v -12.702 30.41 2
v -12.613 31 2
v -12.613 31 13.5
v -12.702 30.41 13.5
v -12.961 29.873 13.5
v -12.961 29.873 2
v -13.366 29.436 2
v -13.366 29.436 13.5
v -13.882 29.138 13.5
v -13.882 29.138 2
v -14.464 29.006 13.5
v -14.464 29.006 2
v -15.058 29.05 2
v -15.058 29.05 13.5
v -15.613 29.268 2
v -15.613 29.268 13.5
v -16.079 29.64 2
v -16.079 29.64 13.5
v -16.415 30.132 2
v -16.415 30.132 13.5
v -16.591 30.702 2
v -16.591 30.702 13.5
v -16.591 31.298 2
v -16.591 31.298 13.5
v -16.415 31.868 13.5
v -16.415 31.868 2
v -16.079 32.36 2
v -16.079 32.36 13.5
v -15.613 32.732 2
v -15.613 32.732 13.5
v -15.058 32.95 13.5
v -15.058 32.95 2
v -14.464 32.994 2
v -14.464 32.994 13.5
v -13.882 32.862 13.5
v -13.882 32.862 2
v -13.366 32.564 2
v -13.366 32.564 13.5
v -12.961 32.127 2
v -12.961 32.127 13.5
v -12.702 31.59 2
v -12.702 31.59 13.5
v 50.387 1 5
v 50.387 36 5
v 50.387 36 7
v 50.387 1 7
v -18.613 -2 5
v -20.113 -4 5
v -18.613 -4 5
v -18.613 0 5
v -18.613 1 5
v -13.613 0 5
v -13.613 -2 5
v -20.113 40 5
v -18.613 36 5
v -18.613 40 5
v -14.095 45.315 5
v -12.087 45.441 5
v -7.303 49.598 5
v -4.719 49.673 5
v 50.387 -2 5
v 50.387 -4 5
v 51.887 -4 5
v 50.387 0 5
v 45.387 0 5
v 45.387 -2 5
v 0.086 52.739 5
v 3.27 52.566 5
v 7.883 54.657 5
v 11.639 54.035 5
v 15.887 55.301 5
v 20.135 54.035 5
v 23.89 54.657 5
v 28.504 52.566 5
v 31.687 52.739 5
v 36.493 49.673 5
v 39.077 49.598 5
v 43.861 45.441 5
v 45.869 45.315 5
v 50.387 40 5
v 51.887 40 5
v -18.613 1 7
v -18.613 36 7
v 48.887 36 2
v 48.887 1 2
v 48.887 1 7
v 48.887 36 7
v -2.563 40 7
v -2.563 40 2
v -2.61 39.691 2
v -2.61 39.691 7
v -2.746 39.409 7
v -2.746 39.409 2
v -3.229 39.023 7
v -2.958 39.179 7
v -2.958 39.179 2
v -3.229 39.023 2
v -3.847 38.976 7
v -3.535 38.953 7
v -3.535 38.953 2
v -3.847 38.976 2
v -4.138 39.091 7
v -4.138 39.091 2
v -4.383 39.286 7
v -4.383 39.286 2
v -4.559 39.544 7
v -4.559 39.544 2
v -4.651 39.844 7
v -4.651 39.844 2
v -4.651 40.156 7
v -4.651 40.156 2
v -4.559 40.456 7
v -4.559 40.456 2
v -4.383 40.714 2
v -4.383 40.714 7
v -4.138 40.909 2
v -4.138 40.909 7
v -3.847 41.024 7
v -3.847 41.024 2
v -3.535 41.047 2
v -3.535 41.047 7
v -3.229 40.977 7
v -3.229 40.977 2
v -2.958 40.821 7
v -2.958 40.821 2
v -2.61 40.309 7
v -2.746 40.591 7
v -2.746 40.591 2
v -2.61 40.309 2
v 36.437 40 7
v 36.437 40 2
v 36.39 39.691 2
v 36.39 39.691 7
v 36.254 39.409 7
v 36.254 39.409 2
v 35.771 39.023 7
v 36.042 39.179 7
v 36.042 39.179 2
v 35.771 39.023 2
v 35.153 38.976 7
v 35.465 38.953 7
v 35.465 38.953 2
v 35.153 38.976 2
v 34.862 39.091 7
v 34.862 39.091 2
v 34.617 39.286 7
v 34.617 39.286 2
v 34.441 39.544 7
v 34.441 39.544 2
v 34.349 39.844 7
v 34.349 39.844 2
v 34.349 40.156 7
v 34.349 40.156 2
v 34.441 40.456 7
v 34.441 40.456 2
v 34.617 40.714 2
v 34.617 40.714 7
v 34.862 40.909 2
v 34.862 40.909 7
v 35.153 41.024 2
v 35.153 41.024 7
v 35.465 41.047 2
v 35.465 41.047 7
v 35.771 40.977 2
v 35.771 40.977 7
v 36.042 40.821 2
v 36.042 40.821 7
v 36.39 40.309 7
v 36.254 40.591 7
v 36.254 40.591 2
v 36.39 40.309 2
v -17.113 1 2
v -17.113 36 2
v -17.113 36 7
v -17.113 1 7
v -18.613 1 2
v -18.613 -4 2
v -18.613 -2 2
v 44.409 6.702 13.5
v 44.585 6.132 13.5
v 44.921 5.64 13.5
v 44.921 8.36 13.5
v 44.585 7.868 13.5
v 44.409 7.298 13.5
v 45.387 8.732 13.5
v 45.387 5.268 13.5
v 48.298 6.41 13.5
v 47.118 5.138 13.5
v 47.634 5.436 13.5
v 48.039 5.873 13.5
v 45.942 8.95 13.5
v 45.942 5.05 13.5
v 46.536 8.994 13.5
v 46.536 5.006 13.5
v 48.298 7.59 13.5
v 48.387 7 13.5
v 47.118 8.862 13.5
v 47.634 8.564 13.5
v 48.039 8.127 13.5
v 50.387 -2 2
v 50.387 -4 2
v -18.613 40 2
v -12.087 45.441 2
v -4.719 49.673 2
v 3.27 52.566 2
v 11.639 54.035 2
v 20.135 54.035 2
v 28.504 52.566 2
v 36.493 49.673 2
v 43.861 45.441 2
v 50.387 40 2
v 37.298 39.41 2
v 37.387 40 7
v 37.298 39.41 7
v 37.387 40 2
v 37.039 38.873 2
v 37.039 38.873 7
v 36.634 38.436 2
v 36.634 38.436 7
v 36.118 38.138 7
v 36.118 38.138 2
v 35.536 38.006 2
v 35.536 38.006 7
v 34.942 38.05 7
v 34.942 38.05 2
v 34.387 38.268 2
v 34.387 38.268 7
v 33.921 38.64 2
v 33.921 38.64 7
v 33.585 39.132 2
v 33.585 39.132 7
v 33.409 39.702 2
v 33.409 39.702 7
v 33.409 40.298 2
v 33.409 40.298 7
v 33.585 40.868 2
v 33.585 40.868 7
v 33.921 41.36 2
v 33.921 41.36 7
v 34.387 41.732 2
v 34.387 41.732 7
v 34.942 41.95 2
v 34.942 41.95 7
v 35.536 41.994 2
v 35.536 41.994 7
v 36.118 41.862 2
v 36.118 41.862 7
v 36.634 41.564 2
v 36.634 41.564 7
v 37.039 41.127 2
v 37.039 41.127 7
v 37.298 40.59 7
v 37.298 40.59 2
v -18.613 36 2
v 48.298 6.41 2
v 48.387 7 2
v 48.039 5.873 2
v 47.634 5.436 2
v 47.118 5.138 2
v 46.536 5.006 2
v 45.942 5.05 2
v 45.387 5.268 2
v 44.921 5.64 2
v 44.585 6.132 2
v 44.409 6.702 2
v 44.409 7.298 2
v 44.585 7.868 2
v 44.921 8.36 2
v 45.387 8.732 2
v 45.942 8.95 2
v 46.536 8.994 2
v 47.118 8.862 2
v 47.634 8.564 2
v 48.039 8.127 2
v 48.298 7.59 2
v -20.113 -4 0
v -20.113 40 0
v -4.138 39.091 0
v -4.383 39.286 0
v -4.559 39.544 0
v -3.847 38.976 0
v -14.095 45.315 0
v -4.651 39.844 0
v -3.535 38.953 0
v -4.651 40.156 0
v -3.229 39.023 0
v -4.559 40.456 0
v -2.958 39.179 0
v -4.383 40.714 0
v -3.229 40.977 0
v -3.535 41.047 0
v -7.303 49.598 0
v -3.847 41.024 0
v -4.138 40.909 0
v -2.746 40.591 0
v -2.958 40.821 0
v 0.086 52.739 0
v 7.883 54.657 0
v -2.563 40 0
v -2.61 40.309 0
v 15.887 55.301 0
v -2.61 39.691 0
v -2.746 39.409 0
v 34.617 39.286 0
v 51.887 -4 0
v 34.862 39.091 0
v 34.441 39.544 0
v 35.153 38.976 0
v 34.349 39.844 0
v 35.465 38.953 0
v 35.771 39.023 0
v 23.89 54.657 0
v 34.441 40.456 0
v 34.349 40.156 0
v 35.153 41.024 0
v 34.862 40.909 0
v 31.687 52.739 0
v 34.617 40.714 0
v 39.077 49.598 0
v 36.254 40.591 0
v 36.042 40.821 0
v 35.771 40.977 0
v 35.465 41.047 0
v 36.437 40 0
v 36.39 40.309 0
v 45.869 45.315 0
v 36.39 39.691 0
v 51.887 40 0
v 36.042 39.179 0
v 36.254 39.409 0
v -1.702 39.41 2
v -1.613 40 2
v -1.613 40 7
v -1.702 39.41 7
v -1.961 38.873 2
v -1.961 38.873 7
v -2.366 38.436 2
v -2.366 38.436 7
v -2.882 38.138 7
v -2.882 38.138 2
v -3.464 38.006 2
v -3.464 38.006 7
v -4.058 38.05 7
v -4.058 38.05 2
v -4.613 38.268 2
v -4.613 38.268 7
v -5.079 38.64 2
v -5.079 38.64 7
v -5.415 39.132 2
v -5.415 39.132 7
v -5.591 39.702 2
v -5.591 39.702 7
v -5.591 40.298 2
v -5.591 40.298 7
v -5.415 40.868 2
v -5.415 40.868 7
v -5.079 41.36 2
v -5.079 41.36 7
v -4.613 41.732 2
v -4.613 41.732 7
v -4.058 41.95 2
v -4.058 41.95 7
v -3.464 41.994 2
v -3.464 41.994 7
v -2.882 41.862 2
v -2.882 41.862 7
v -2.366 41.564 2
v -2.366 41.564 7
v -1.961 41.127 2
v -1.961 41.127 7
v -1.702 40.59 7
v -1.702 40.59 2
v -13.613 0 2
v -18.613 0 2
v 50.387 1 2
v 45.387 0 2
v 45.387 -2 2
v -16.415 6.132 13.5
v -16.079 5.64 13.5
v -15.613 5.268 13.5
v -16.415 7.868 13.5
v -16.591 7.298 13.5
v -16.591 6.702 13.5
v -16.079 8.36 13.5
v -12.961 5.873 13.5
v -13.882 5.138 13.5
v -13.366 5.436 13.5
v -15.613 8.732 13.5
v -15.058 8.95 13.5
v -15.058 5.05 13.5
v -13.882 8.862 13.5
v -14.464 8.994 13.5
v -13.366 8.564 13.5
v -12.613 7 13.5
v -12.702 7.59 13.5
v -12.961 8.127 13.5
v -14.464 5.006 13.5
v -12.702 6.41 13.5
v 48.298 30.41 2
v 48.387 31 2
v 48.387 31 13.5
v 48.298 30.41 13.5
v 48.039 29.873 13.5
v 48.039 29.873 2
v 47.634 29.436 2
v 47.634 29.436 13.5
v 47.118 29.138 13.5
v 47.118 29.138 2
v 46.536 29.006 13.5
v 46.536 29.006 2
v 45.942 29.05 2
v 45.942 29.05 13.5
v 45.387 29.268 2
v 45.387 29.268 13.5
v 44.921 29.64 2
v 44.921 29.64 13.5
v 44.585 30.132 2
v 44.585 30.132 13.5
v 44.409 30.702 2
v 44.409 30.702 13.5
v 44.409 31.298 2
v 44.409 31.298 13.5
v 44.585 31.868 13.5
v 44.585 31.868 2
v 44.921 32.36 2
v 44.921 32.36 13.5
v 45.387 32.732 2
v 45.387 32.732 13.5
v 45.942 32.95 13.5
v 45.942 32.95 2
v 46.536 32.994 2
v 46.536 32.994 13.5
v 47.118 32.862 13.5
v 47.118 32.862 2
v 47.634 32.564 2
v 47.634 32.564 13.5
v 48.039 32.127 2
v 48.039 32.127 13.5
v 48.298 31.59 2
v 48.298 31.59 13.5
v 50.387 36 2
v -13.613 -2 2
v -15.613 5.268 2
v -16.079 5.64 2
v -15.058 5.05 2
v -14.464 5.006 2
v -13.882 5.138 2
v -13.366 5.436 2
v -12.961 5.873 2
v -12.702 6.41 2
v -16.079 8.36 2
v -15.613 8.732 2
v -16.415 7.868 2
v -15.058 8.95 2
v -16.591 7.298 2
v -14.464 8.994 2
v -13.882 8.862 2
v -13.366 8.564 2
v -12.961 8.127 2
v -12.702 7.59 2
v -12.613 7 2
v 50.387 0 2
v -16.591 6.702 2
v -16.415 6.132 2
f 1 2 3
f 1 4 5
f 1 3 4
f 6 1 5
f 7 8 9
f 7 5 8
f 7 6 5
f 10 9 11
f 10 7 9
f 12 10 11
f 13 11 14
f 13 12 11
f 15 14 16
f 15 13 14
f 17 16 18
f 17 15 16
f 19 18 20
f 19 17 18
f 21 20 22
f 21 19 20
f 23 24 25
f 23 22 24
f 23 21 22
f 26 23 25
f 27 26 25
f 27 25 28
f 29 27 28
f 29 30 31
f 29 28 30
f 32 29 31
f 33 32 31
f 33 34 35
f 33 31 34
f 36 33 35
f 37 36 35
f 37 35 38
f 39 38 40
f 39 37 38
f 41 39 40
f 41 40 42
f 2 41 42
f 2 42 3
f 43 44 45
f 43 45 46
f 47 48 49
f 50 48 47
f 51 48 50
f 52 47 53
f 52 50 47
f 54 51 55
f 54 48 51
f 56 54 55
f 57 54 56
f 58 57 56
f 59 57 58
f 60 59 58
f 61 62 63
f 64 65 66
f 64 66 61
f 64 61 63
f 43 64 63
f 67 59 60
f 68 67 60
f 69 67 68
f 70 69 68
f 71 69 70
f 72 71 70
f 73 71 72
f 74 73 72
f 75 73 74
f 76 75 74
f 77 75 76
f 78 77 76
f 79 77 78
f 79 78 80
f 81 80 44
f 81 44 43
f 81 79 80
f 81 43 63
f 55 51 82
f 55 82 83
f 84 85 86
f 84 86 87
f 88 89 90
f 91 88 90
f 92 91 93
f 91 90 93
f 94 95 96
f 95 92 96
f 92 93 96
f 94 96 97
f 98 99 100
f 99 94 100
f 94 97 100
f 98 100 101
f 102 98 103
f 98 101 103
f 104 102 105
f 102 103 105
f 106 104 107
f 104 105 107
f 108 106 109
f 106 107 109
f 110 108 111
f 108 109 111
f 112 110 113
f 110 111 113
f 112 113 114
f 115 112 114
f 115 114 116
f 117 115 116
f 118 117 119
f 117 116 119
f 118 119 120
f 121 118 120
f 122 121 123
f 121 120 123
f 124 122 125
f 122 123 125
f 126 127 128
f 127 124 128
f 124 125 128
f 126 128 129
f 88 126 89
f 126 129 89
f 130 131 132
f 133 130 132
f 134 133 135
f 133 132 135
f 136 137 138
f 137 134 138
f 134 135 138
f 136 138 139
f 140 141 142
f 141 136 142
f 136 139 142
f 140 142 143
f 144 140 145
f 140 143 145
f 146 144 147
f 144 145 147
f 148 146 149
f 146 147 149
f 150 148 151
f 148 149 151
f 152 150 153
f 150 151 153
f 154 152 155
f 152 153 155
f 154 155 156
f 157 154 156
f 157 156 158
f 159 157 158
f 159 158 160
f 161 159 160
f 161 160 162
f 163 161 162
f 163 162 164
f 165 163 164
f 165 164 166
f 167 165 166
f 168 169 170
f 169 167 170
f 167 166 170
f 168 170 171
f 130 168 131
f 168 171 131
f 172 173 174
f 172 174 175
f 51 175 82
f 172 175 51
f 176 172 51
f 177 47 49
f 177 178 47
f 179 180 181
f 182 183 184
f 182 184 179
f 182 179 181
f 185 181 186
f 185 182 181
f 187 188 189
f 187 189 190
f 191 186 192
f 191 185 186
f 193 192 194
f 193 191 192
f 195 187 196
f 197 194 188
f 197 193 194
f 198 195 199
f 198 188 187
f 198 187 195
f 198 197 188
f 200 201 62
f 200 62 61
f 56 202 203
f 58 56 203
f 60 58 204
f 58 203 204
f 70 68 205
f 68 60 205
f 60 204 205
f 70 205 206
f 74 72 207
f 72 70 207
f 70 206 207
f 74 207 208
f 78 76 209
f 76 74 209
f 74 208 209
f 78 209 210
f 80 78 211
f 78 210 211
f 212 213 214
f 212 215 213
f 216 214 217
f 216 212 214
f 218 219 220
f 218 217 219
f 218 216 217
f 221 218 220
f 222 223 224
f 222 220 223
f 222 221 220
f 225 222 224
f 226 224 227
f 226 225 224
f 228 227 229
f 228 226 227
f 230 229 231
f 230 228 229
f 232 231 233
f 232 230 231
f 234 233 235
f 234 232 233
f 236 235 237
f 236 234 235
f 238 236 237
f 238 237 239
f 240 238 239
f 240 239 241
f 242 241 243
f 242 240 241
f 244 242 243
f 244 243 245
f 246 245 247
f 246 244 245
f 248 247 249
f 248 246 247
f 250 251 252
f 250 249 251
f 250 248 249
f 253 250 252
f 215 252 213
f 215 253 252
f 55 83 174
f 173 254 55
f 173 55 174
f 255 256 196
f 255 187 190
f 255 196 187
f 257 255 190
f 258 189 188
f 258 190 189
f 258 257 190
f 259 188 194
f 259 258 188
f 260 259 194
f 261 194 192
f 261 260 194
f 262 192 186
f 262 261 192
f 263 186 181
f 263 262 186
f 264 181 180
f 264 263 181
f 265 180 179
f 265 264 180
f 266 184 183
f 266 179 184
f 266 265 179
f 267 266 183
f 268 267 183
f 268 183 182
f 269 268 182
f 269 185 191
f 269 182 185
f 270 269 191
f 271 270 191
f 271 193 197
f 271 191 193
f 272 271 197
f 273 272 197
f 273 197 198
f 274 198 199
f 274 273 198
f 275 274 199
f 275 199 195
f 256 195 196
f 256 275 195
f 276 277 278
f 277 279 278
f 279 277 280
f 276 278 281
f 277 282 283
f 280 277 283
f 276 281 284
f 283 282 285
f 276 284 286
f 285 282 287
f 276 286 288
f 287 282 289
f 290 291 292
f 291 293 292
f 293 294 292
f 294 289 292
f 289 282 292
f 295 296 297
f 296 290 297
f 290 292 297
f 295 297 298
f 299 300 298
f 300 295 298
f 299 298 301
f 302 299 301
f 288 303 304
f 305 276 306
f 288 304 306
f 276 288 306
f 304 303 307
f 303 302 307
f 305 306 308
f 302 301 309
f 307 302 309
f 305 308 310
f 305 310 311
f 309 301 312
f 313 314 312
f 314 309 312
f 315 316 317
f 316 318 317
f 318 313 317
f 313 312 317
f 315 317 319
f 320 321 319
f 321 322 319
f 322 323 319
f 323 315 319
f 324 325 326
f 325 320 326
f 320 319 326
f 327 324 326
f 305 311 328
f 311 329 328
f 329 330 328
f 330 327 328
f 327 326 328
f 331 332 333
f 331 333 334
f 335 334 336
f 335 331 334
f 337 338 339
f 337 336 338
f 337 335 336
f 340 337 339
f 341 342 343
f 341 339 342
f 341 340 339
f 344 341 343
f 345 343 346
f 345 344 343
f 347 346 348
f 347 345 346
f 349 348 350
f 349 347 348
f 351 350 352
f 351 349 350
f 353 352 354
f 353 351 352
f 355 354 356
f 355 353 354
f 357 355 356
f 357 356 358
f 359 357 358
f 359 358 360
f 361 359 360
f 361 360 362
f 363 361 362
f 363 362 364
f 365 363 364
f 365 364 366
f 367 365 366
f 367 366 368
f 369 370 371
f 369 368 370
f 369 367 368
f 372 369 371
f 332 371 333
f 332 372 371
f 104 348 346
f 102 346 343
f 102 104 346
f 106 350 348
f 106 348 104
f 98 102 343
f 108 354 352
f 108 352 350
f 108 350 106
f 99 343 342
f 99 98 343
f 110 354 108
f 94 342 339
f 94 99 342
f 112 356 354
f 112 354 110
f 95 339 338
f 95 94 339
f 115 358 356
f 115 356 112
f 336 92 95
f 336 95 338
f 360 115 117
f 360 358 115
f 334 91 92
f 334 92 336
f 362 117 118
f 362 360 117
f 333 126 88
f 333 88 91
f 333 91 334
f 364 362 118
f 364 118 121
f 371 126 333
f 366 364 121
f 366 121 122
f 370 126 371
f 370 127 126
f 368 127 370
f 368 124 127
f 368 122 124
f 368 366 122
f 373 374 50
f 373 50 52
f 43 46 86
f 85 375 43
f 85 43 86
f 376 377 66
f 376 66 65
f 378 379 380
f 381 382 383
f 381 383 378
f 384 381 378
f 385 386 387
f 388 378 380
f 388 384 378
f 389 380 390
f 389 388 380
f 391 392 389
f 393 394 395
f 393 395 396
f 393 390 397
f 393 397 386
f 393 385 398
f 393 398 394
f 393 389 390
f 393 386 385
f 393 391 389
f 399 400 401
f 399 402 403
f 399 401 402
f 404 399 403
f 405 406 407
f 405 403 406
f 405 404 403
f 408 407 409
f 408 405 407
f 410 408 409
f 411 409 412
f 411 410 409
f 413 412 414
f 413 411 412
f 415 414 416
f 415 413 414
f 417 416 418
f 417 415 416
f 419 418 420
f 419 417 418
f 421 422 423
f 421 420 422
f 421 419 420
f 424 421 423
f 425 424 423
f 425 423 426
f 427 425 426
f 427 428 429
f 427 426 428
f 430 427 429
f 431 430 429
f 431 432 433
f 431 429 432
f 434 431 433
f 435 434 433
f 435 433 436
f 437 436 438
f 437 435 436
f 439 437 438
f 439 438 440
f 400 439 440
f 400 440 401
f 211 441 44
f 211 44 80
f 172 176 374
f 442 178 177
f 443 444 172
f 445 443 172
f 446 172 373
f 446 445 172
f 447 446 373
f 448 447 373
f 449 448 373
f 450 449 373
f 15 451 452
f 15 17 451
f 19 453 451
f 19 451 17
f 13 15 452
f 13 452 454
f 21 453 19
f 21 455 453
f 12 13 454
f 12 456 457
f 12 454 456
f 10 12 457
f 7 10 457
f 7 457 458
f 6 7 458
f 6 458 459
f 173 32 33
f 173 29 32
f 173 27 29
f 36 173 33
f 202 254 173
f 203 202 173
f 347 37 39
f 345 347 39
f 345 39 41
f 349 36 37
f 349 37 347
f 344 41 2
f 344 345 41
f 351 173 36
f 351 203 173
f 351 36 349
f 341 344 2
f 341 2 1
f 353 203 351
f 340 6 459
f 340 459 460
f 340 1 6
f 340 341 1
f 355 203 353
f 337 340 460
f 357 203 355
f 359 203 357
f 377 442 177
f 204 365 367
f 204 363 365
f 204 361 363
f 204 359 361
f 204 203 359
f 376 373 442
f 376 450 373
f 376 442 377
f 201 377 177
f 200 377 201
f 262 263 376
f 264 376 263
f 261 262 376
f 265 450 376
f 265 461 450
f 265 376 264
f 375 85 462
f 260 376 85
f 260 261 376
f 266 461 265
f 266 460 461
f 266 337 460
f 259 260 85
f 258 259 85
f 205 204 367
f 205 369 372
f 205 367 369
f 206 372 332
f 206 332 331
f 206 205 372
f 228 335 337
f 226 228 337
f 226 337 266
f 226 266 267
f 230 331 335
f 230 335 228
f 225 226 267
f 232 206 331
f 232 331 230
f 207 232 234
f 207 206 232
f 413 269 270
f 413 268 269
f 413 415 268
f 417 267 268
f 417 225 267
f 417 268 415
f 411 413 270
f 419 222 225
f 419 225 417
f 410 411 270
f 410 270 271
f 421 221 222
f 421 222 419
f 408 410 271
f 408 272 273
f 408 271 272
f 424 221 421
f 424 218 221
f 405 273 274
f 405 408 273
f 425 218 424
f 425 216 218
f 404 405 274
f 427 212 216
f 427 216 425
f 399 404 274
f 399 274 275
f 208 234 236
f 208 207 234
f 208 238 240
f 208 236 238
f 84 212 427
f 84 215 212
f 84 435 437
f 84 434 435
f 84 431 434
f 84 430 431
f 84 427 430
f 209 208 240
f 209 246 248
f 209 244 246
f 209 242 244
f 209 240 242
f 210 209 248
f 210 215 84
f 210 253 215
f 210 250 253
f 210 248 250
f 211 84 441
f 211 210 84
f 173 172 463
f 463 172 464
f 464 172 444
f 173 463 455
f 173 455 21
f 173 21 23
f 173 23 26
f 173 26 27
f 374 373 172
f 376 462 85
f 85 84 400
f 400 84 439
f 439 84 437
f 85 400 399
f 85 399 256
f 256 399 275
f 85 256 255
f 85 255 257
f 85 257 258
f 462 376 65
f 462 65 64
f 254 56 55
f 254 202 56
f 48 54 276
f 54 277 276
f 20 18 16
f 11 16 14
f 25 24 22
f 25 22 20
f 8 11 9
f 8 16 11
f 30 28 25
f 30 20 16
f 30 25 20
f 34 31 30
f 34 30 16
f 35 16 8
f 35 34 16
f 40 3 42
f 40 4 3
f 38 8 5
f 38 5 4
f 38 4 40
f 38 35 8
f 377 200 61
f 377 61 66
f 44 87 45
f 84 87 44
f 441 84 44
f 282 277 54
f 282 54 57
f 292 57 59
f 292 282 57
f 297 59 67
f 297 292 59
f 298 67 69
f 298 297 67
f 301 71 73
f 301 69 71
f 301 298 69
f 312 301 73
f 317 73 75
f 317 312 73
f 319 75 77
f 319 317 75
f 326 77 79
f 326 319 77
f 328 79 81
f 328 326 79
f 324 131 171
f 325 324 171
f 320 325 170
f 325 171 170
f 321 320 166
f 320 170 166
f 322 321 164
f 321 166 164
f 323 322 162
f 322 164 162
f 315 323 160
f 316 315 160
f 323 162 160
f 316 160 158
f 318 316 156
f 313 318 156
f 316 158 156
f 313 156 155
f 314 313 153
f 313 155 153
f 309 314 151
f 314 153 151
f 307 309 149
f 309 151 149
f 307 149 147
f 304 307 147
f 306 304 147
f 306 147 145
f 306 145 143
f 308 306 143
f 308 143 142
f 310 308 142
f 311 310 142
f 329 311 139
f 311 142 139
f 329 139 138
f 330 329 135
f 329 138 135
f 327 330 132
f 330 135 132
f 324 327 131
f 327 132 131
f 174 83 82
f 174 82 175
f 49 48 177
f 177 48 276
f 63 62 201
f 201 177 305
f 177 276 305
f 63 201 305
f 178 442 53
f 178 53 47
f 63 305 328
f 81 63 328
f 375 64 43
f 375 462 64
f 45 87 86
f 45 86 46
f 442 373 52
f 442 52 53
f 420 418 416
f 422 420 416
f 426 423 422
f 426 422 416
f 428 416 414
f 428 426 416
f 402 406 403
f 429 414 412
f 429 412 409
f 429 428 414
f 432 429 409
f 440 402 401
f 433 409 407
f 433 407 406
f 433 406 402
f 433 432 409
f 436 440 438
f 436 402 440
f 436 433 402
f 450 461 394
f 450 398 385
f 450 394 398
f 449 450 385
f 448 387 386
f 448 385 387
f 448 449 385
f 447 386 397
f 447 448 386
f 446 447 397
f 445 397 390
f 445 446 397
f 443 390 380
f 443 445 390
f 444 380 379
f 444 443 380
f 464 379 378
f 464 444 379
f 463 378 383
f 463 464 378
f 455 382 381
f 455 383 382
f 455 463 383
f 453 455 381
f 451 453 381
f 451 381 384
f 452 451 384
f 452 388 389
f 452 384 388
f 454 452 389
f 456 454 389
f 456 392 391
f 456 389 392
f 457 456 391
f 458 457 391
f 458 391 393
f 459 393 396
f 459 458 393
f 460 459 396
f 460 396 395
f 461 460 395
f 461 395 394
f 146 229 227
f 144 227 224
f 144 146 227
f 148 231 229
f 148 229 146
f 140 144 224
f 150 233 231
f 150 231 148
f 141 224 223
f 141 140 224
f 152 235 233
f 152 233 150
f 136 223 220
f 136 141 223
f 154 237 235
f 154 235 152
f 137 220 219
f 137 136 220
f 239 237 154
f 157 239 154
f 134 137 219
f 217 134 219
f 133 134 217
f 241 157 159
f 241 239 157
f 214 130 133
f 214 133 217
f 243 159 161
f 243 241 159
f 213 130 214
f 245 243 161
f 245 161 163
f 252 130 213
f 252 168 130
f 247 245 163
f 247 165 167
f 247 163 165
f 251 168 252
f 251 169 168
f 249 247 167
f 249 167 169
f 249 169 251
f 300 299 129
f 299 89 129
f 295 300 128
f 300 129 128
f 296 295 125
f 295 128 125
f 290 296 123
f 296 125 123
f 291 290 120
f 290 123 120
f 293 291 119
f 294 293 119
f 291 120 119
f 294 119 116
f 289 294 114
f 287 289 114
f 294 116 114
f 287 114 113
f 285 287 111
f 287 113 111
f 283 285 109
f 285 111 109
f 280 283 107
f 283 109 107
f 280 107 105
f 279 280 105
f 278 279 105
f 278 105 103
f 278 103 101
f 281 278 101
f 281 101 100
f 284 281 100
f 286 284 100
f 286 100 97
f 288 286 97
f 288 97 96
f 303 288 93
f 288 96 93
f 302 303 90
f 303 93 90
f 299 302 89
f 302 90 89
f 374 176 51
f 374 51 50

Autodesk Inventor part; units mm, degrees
ref_plane "YZ Plane" through (0, 0, 0) normal (1, 0, 0) x (0, 1, 0)
ref_plane "XZ Plane" through (0, 0, 0) normal (0, 1, 0) x (-1, 0, 0)
ref_plane "XY Plane" through (0, 0, 0) normal (0, 0, 1) x (1, 0, 0)
sketch "Skizze1" plane through (0, 0, 0) normal (0, 0, 1) x (1, 0, 0)
  line L0 (-20.1131, -4) -> (51.8869, -4)
  line L1 (51.8869, -4) -> (51.8869, 40)
  line L2 (51.8869, 40) -> (-20.1131, 40)
  line L3 (-20.1131, 40) -> (-20.1131, -4)
  arc A0 (51.8869, 40) -> (-20.1131, 40) centre (15.8869, 5.3013) ccw
  line L4 (50.3869, -4) -> (50.3869, 40)
  line L5 (-18.6131, 40) -> (-18.6131, -4)
  arc A1 (50.3869, 40) -> (-18.6131, 40) centre (15.8869, 5.2581) ccw
  point P0 (0, 0)
  dimension "d0" = 72
  dimension "d1" = 44
  dimension "d2" = 50
  dimension "d3" = 1.5
  dimension "d4" = 1.5
extrude "Extrusion1" add sketch "Skizze1" along normal blind 2 contours L5 L2 L4 L0 | A1 L2
extrude "Extrusion2" add sketch "Skizze1" along normal blind 5 contours L3 L2 L5 L0 | A0 L2 A1 | L4 L2 L1 L0
sketch "Skizze2" plane through (0, 0, 2) normal (0, 0, 1) x (1, 0, 0)
  line L0 (50.3869, 40) -> (50.3869, -4) projected
  line L1 (50.3869, -4) -> (43.3869, -4)
  line L2 (-18.6131, 0) -> (-13.6131, 0)
  line L3 (-13.6131, 0) -> (-13.6131, -2)
  line L4 (-13.6131, -2) -> (-18.6131, -2)
  line L5 (-18.6131, -2) -> (-18.6131, 0)
  line L6 (45.3869, 0) -> (50.3869, 0)
  line L7 (50.3869, 0) -> (50.3869, -2)
  line L8 (50.3869, -2) -> (45.3869, -2)
  line L9 (45.3869, -2) -> (45.3869, 0)
  line L10 (-18.6131, -4) -> (50.3869, -4) projected
  circle A0 centre (-14.6131, 7) radius 2
  circle A1 centre (46.3869, 7) radius 2
  circle A2 centre (46.3869, 31) radius 2
  circle A3 centre (-14.6131, 31) radius 2
  line L11 (-18.6131, -4) -> (-18.6131, 40) projected
  circle A4 centre (-3.6131, 40) radius 1.05
  circle A5 centre (-3.6131, 40) radius 2
  circle A6 centre (35.3869, 40) radius 1.05
  circle A7 centre (35.3869, 40) radius 2
  line L12 (50.3869, 1) -> (48.8869, 1)
  line L13 (48.8869, 1) -> (48.8869, 36)
  line L14 (48.8869, 36) -> (50.3869, 36)
  line L15 (50.3869, 36) -> (50.3869, 1)
  line L16 (-18.6131, 36) -> (-17.1131, 36)
  line L17 (-17.1131, 36) -> (-17.1131, 1)
  line L18 (-17.1131, 1) -> (-18.6131, 1)
  line L19 (-18.6131, 1) -> (-18.6131, 36)
  point P0 (0, 0)
  point P1 (45.3869, -1)
  point P2 (-13.6131, -1)
  point P3 (-16.1131, -2)
  point P4 (49.6369, 1)
  point P5 (-17.8631, 1)
  dimension "d40" = 5
  dimension "d41" = 2
  dimension "d43" = 5
  dimension "d44" = 2
  dimension "d45" = 2
  dimension "d46" = 59
  dimension "d52" = 2
  dimension "d53" = 4
  dimension "d54" = 4
  dimension "d55" = 4
  dimension "d56" = 4
  dimension "d57" = 4
  dimension "d58" = 4
  dimension "d59" = 4
  dimension "d60" = 4
  dimension "d61" = 35
  dimension "d62" = 11
  dimension "d63" = 11
  dimension "d64" = 35
  dimension "d69" = 2.1
  dimension "d70" = 4
  dimension "d71" = 2.1
  dimension "d72" = 4
  dimension "d73" = 15
  dimension "d74" = 15
  dimension "d75" = 44
  dimension "d76" = 44
  dimension "d81" = 1.5
  dimension "d82" = 35
  dimension "d83" = 5
  dimension "d84" = 1.5
  dimension "d85" = 35
  dimension "d87" = 5
extrude "Extrusion7" add sketch "Skizze2" along normal blind 3 contours L5 L2 L3 L4 | L0 L8 L9 L6
extrude "Extrusion8" add sketch "Skizze2" along normal blind 11.5 contours A0 | A1 | A2 | A3
extrude "Extrusion9" add sketch "Skizze2" along normal blind 5 contours L11 L16 L17 L18 | L0 L12 L13 L14 | A5 | A7
extrude "Extrusion10" cut sketch "Skizze2" against normal up to next contours A4 | A6
properties part number "Spiel_Deckel"
